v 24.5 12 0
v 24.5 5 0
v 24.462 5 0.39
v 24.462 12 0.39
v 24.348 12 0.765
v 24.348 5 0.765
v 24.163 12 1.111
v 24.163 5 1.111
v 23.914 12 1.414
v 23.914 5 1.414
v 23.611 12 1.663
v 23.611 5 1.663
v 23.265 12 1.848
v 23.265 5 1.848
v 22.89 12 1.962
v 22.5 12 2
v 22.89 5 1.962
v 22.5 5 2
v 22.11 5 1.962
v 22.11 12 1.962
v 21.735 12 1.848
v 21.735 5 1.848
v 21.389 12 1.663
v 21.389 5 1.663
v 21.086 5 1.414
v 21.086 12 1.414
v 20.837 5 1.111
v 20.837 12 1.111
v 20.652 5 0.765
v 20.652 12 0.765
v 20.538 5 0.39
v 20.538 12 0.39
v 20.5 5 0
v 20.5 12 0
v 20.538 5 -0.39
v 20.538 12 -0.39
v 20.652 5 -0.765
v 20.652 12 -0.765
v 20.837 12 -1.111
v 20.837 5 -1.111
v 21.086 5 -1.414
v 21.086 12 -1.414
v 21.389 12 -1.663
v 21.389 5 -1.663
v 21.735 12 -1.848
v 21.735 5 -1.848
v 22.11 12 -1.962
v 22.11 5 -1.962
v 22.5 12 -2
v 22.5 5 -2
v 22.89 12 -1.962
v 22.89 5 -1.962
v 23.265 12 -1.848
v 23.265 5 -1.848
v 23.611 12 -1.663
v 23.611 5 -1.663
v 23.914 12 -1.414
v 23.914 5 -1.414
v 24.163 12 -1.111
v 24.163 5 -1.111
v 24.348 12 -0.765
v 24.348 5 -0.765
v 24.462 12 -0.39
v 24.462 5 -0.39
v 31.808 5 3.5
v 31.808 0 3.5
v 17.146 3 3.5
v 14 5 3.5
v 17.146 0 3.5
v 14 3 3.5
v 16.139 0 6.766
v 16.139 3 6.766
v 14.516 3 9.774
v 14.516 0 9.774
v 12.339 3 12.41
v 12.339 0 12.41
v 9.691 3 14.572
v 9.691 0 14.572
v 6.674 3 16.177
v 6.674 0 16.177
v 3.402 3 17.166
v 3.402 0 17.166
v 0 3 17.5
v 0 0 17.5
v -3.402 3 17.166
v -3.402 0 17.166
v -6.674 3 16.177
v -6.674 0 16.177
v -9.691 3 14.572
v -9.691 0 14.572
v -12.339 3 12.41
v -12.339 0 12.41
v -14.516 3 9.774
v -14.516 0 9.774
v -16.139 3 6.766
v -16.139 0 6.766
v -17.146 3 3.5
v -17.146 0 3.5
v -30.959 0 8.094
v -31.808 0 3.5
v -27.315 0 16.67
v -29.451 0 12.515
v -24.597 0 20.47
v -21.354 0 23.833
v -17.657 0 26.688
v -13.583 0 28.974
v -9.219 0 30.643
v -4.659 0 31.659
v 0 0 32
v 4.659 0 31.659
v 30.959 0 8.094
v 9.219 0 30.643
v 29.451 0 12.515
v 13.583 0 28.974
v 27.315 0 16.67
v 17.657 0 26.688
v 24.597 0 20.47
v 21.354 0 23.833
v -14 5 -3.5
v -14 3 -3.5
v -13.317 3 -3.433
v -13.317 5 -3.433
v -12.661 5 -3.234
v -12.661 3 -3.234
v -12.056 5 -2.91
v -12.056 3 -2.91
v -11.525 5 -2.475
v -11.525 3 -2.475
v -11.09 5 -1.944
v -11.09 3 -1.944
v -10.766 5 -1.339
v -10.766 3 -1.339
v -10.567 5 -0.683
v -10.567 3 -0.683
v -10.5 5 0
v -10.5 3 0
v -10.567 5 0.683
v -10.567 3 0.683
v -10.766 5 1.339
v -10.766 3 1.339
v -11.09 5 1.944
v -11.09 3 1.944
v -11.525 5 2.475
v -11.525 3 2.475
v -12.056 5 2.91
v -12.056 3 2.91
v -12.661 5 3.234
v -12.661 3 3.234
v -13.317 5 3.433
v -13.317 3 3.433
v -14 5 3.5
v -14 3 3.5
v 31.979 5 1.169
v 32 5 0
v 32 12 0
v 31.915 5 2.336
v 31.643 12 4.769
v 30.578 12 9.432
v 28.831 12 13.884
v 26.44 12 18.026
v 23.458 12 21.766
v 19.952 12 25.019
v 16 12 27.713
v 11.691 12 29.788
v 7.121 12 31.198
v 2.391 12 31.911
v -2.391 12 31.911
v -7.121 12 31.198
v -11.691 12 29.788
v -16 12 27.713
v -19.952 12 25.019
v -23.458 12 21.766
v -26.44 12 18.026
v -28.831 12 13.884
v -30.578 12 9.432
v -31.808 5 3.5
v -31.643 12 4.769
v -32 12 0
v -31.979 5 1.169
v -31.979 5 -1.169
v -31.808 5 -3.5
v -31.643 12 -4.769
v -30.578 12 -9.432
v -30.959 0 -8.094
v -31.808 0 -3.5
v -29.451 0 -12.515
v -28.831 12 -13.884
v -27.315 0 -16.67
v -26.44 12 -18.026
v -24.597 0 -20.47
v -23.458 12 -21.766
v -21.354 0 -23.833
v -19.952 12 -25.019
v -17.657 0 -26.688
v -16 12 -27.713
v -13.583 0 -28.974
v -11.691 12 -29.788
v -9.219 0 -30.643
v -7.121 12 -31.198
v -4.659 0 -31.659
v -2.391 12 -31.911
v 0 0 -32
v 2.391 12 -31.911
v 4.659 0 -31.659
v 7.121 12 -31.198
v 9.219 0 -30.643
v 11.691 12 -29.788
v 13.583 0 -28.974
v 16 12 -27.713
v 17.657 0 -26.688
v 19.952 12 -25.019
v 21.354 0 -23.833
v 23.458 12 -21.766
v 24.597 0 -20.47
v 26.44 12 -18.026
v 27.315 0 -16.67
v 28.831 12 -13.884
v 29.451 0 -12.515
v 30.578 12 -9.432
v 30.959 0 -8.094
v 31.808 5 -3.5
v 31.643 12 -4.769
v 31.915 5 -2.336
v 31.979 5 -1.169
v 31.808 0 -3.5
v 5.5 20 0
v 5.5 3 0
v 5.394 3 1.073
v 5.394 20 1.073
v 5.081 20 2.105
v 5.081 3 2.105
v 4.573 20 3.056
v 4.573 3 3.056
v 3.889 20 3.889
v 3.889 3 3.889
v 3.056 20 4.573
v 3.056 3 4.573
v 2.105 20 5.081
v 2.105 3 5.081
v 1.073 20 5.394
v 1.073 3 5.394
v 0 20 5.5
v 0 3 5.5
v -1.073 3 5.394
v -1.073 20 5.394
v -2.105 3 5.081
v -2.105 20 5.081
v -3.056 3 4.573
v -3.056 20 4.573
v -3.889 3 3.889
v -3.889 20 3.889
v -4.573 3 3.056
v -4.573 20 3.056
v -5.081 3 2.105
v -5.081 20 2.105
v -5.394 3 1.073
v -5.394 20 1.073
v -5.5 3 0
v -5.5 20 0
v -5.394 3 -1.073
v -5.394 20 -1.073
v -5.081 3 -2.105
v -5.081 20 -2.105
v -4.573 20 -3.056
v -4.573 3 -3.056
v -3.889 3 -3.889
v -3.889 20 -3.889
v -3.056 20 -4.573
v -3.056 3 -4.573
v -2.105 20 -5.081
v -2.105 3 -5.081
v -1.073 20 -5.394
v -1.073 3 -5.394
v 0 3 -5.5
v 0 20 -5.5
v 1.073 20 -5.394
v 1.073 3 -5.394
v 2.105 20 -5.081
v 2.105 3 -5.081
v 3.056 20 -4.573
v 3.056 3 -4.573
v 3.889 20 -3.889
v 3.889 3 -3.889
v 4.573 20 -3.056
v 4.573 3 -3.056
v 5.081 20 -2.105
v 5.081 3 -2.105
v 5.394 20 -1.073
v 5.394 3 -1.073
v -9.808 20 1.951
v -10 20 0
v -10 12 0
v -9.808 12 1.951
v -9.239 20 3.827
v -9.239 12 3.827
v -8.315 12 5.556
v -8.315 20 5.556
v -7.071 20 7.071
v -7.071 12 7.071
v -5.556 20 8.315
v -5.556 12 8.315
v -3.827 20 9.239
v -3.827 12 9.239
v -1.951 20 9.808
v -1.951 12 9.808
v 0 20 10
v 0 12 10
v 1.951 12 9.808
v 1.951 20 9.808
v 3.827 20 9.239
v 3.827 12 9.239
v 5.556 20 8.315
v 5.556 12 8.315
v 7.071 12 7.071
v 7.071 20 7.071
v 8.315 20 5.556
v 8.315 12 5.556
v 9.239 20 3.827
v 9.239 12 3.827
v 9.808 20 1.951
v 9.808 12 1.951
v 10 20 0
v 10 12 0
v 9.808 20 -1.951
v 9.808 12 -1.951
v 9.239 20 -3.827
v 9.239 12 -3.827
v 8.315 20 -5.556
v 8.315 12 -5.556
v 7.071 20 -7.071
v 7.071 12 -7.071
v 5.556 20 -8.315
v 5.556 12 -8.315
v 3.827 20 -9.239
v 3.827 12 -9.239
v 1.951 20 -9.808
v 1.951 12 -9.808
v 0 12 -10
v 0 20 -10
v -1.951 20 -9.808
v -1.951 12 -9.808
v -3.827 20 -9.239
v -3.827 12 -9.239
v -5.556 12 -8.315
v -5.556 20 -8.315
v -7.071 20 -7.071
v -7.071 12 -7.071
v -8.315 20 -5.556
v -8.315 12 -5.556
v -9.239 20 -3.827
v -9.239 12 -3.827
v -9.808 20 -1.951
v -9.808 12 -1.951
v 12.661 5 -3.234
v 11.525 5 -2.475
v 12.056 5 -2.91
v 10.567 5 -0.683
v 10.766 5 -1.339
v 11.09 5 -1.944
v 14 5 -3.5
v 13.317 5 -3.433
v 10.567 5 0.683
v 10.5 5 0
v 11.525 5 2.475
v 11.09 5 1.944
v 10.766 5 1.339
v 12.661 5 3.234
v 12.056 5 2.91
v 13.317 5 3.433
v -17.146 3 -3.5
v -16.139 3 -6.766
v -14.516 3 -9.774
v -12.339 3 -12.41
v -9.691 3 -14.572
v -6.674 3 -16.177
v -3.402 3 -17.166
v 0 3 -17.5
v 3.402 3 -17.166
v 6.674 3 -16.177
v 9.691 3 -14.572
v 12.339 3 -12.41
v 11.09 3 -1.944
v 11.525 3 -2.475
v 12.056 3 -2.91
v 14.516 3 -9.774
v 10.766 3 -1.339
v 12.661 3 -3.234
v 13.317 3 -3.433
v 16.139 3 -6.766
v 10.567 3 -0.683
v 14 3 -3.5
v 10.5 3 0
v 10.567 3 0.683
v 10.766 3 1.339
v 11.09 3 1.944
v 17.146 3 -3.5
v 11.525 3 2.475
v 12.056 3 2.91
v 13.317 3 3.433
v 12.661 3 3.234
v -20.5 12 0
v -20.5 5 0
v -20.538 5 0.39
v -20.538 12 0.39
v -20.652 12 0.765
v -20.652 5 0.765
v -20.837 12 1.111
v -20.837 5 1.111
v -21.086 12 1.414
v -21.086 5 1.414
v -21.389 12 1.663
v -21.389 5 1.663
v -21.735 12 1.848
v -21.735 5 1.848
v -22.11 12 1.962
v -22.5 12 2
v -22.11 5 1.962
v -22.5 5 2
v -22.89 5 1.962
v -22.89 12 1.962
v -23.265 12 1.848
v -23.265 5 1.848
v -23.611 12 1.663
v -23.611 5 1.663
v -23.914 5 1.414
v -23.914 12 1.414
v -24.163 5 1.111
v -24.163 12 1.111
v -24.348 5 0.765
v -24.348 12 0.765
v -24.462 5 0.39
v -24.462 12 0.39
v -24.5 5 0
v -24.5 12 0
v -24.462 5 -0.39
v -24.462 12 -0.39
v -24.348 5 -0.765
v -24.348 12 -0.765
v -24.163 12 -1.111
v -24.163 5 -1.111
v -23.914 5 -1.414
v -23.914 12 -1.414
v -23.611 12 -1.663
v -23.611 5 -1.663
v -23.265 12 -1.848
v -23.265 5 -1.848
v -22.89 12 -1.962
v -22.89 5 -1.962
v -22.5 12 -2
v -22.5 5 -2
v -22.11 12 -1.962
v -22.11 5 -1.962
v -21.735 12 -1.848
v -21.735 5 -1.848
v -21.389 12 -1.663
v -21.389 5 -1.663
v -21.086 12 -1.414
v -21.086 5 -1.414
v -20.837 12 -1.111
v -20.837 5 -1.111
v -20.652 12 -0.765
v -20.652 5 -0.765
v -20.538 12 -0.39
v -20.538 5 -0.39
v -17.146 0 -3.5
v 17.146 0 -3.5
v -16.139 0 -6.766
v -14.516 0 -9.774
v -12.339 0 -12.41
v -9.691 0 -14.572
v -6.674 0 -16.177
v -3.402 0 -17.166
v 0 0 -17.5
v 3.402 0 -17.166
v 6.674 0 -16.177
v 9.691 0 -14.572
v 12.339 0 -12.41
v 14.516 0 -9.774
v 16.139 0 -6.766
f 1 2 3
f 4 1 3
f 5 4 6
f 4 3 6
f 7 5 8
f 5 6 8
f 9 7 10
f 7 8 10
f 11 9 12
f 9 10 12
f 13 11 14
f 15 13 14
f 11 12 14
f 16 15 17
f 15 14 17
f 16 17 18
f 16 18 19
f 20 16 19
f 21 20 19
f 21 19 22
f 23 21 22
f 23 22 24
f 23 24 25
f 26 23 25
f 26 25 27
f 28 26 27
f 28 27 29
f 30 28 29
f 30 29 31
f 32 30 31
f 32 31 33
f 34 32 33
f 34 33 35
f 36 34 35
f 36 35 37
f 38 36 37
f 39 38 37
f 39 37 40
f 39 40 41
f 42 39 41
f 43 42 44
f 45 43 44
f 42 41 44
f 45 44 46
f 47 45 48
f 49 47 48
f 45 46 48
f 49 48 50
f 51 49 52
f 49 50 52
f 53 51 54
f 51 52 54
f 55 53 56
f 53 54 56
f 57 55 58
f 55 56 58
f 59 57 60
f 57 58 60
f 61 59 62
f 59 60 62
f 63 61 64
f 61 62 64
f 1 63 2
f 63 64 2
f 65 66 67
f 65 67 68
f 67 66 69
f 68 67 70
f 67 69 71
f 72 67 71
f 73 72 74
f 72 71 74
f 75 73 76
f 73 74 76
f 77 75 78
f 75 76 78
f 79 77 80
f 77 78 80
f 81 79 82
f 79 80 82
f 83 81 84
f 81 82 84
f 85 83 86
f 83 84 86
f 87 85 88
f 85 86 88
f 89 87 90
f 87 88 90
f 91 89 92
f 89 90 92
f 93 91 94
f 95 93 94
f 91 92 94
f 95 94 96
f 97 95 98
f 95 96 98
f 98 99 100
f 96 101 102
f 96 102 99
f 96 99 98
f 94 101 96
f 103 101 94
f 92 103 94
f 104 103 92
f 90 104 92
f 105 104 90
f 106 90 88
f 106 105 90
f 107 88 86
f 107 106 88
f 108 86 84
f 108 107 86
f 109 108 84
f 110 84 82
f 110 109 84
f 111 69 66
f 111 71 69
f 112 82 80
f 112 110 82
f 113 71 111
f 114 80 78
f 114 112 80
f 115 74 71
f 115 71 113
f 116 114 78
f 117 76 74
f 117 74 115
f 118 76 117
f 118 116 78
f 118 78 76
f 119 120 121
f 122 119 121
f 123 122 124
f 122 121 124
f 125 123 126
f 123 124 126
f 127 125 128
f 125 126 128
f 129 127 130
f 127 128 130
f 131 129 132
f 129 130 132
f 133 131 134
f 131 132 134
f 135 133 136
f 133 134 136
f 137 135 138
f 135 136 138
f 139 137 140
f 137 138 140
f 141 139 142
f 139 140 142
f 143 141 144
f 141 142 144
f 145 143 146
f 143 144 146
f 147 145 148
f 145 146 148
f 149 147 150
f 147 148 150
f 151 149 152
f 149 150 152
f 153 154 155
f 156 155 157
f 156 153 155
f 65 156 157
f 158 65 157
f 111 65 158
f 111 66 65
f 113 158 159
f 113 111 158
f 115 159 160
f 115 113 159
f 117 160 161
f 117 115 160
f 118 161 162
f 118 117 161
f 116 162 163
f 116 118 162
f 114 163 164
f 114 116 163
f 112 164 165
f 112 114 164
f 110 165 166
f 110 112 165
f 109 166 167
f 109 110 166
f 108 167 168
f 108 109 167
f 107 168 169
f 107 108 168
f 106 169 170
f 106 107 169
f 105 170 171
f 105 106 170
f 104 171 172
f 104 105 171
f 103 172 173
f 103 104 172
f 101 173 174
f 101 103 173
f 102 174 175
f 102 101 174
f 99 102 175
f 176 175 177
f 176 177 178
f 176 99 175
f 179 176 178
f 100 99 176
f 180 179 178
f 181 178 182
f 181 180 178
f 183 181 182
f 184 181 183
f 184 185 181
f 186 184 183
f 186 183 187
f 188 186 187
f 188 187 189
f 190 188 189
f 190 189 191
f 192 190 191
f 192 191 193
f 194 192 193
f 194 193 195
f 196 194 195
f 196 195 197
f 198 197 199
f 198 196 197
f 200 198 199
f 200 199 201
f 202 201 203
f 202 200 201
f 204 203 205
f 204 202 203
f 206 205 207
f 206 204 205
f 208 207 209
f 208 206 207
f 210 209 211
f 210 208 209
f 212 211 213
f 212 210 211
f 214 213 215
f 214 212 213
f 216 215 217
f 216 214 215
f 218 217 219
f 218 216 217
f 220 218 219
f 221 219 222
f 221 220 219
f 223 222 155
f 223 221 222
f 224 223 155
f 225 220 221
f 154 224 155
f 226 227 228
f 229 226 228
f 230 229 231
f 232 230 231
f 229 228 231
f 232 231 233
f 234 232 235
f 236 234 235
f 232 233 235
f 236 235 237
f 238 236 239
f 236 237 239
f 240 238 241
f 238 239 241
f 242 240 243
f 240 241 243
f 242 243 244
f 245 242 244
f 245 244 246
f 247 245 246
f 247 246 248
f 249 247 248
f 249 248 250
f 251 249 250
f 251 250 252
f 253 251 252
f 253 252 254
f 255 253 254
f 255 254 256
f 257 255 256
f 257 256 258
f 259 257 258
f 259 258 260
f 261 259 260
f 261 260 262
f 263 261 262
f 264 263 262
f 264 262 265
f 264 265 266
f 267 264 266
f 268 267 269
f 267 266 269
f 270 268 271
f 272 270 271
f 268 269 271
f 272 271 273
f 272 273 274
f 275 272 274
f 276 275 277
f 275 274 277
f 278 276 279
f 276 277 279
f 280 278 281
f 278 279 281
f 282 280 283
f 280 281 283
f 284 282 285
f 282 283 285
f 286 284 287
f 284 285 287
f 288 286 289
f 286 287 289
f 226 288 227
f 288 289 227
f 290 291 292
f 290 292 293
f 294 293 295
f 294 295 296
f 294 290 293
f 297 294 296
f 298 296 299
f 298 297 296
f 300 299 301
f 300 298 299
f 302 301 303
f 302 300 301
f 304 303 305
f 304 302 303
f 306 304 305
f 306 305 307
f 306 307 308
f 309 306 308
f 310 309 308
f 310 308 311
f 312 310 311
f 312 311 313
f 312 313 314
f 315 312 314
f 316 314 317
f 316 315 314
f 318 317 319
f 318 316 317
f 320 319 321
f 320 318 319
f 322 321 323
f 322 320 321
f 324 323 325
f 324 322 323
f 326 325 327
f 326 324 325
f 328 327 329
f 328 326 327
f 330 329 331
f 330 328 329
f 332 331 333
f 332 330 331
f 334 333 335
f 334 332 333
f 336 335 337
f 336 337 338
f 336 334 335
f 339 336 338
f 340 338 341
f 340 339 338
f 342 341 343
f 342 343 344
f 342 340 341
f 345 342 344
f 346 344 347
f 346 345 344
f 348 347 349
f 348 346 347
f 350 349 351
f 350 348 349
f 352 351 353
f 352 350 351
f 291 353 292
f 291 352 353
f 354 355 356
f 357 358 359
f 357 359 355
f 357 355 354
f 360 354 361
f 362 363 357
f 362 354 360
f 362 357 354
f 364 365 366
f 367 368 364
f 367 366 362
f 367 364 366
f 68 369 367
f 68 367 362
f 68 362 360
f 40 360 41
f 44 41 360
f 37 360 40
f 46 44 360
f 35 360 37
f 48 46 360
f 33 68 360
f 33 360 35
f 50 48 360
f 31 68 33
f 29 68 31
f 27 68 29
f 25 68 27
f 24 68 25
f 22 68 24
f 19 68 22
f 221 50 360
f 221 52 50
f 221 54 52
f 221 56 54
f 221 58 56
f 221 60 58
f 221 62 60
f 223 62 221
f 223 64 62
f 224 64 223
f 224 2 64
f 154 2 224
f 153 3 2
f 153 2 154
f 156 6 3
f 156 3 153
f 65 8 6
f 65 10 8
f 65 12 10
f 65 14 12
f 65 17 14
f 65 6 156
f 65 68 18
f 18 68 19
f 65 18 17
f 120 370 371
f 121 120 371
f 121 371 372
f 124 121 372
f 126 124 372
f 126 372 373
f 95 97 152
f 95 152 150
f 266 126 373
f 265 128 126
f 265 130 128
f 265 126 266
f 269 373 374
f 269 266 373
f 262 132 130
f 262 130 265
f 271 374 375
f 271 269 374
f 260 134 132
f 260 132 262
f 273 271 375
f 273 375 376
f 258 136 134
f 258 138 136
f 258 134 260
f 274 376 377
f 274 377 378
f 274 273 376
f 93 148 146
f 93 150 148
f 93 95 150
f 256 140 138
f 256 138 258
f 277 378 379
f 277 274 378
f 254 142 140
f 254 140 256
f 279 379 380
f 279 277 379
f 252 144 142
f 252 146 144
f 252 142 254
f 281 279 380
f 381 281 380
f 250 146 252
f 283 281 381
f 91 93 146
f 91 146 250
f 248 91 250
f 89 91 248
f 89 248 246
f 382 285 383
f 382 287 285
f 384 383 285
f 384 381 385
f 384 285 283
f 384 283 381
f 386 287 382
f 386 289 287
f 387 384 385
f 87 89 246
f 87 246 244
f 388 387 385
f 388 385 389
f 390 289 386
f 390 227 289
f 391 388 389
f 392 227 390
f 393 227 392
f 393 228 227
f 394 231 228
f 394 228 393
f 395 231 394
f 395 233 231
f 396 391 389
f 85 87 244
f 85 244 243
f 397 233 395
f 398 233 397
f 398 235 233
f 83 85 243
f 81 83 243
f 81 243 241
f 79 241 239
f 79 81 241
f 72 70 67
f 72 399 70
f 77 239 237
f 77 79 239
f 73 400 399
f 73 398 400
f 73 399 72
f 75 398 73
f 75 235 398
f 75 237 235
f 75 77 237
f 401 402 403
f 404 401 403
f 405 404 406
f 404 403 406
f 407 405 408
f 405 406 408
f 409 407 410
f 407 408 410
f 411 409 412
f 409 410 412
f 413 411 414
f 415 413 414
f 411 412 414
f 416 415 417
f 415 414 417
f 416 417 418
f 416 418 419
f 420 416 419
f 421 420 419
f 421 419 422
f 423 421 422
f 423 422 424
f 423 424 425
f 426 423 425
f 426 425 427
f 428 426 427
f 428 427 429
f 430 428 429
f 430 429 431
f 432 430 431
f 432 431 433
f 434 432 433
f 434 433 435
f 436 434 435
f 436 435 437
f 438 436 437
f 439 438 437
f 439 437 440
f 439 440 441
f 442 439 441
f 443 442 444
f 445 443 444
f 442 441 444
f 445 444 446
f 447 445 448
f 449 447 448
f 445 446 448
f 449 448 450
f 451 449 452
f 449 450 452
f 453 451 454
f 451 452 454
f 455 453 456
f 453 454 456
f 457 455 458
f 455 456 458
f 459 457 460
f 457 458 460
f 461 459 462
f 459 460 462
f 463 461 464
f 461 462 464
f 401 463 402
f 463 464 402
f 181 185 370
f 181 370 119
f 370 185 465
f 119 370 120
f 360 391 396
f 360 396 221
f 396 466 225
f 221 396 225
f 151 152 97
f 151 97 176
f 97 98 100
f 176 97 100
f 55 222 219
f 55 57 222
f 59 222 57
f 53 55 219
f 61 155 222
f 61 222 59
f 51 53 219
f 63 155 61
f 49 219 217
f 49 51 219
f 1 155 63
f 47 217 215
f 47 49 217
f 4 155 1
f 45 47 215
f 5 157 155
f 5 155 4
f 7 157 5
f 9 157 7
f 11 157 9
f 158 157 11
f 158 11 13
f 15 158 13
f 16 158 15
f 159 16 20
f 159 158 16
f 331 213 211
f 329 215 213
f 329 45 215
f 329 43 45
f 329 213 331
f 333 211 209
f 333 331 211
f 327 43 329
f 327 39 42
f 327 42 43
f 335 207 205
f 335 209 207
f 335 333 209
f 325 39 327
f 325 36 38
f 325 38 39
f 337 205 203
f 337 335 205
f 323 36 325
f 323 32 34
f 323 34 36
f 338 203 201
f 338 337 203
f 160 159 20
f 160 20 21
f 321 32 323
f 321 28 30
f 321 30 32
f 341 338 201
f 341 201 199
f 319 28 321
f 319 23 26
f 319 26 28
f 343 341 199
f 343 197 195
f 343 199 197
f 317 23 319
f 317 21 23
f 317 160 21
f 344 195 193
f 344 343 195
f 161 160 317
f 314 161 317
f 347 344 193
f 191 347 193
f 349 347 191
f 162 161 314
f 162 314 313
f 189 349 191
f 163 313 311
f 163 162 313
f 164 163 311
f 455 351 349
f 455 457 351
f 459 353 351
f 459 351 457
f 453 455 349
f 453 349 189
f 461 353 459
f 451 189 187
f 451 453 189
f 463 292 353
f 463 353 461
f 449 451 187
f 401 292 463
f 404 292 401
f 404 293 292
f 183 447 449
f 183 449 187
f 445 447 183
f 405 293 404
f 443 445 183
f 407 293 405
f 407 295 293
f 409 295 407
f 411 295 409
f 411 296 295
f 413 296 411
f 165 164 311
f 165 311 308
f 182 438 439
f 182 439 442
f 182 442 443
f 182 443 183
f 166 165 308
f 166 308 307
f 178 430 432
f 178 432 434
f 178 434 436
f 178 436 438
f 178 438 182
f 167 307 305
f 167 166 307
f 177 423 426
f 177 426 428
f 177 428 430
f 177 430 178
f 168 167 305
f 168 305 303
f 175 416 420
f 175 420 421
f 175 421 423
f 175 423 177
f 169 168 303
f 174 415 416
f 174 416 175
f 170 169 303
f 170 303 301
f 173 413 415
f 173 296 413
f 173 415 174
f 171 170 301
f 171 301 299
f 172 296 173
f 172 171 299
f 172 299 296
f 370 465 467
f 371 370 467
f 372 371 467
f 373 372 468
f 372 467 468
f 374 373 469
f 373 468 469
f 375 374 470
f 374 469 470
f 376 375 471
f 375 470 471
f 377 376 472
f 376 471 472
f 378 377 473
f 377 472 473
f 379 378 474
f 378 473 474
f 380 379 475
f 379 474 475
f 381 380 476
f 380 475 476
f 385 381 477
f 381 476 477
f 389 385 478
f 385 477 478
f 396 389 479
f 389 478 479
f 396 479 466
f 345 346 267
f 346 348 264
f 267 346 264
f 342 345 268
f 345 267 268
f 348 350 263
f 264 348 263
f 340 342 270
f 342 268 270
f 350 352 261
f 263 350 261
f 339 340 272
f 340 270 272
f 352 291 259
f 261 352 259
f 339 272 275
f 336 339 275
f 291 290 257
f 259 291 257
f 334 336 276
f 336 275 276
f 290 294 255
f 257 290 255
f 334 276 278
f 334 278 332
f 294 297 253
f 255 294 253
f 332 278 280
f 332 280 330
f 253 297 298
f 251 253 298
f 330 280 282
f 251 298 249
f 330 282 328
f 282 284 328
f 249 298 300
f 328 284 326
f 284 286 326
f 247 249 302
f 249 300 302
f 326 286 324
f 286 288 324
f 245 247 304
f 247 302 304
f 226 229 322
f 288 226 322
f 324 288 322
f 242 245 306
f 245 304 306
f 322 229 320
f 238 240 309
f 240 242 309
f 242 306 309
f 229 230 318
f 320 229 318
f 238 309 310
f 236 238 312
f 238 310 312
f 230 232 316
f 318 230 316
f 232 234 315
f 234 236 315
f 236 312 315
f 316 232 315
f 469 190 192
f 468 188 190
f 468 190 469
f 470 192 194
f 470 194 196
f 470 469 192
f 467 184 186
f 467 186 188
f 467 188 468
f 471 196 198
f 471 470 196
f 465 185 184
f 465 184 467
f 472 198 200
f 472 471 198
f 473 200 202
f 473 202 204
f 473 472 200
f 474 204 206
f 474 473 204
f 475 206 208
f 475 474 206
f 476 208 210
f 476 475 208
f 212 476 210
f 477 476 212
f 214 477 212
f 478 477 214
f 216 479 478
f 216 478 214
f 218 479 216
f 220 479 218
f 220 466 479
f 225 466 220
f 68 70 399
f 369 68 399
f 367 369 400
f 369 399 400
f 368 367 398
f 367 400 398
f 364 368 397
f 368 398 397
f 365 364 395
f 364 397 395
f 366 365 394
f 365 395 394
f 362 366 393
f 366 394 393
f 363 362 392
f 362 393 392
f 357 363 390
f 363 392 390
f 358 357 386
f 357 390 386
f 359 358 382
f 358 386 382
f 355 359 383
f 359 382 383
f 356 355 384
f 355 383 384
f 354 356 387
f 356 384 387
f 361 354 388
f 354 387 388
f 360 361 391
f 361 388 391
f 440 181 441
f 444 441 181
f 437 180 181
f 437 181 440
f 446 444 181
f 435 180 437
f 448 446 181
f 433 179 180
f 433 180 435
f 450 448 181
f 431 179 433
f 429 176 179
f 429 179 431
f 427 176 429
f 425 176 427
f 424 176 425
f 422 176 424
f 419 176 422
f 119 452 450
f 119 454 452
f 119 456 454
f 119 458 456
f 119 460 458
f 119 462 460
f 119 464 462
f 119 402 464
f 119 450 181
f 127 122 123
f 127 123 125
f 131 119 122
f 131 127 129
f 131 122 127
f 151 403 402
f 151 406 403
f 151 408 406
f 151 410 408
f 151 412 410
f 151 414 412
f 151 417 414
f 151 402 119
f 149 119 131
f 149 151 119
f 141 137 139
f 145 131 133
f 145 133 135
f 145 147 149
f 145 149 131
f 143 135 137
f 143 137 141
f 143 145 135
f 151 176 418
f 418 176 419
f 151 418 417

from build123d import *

# Parameters (mm, degrees)
F0_R      = 32
F1_DEPTH  = 20
F2_R      = 17.5
F3_DEPTH  = 3
F5_DEPTH  = 5
F6_R      = 32
F6_R_2    = 10
F7_DEPTH  = 8
F8_R      = 5.5
F9_DEPTH  = 17.001
F10_R     = 2
F11_DEPTH = 20.001


with BuildPart() as f1:
    # F0 (on Front) → F1 (new body)
    with BuildSketch(Plane.XZ):
        Circle(F0_R)
    extrude(amount=-F1_DEPTH)

    # F2 (on Front) → F3 (cut)
    with BuildSketch(Plane.XZ):
        Circle(F2_R)
    extrude(amount=-F3_DEPTH, mode=Mode.SUBTRACT)

    # F4 (on face) → F5 (cut)
    with BuildSketch(Plane.XZ):
        with BuildLine():
            Line((32, 3.5), (14, 3.5))
            ThreePointArc((14, 3.5), (10.5, 0), (14, -3.5))
            Line((14, -3.5), (32, -3.5))
            Line((32, -3.5), (32, 3.5))
        make_face()
        with BuildLine():
            ThreePointArc((-14, -3.5), (-10.5, 0), (-14, 3.5))
            Line((-14, 3.5), (-32, 3.5))
            Line((-32, 3.5), (-32, -3.5))
            Line((-32, -3.5), (-14, -3.5))
        make_face()
    extrude(amount=-F5_DEPTH, mode=Mode.SUBTRACT)

    # F6 (on face) → F7 (cut)
    with BuildSketch(Plane(origin=(0, 20, 0), x_dir=(-1, 0, 0), z_dir=(0, 1, 0))):
        Circle(F6_R)
        Circle(F6_R_2, mode=Mode.SUBTRACT)
    extrude(amount=-F7_DEPTH, mode=Mode.SUBTRACT)

    # F8 (on face) → F9 (cut, through all)
    with BuildSketch(Plane.XZ.offset(-3)):
        Circle(F8_R)
    extrude(amount=-F9_DEPTH, mode=Mode.SUBTRACT)

    # F10 (on Front) → F11 (cut, through all)
    with BuildSketch(Plane.XZ):
        with Locations((-22.5, 0)):
            Circle(F10_R)
        with Locations((22.5, 0)):
            Circle(F10_R)
    extrude(amount=-F11_DEPTH, mode=Mode.SUBTRACT)


solid = f1.part
